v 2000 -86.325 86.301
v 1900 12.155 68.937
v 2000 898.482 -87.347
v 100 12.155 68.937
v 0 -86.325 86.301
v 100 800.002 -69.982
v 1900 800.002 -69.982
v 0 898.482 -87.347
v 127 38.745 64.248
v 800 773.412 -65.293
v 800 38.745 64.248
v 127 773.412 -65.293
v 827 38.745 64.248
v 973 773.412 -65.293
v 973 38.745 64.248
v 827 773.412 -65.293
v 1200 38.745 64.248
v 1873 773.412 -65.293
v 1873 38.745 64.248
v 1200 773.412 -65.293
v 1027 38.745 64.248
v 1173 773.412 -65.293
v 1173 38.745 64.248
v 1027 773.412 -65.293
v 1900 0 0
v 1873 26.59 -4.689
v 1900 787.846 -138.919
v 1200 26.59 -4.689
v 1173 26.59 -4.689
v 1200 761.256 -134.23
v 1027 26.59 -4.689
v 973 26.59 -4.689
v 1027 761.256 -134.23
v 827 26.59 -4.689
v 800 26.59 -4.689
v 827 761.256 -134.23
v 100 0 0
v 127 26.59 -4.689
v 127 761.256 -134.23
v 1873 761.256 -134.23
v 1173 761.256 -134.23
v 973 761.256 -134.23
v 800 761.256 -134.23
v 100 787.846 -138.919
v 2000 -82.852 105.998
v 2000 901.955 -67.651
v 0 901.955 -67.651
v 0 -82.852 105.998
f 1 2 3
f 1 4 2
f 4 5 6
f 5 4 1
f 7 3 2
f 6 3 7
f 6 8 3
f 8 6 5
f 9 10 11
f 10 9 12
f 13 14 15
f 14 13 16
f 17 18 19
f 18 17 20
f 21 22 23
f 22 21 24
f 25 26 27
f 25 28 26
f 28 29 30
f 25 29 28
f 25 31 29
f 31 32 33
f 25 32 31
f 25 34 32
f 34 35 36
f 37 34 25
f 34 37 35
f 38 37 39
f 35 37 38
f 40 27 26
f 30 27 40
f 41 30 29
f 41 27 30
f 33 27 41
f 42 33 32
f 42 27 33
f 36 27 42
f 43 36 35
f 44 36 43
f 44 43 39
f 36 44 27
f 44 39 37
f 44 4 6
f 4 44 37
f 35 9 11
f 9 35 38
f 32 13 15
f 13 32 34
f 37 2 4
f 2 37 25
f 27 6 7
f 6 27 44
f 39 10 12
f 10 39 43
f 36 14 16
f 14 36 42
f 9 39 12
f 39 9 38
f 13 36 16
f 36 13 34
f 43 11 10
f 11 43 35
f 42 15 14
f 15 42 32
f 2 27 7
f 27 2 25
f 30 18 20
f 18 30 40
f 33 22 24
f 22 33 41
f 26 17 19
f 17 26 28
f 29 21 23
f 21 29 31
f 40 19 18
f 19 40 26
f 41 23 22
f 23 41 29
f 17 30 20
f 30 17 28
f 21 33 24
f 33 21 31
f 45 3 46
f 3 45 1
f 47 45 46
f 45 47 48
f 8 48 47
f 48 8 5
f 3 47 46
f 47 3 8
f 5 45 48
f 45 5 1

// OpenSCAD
// file: roof-frame.scad
/*

    Nightstand
    
    By Anton Augustsson
    
    
*/

module roofFrame (
    plankWidth,plankThickness,
    totalWidth,totalLength,
    roofHangover,roofThickness,
    x,y,z,rotation){



// ---------- Calculated varables ----------

positionMiddleStud=700;
//totalLength/3*2-plankThickness+roofHangover+100

// ---------- Code ---------- 

translate([x,y,z])
rotate([0,0,rotation])  
union(){    
// ---------- Stud ---------- 
color("Wheat")
union(){
// Stud Front
translate([
    0,
    0,
    0]) 
cube(size = [
    (totalLength-roofHangover*2)/2,
    plankThickness,
    plankWidth]);

// Stud Back
translate([
    0,
    totalWidth-plankThickness
    -roofHangover*2,
    0]) 
cube(size = [
    (totalLength-roofHangover*2)/2,
    plankThickness,
    plankWidth]);

// Stud Left
translate([
    0,
    plankThickness,
    0]) 
cube(size = [
    plankThickness,
    totalWidth-plankThickness*2
    -roofHangover*2,
    plankWidth]);    

// Stud Middle
translate([
    positionMiddleStud,
    plankThickness,
    0]) 
cube(size = [
    plankThickness,
    totalWidth-plankThickness*2
    -roofHangover*2,
    plankWidth]);  

// Stud Right
translate([
    (totalLength-roofHangover*2)/2
    -plankThickness,
    plankThickness,
    0]) 
cube(size = [
    plankThickness,
    totalWidth-plankThickness*2
    -roofHangover*2,
    plankWidth]);
}
}}



/*
    ---------- Exampel ---------- 
*/


rotation = 10;
plankWidth     = 140;  // pine

plankThickness = 45;  // pine

totalWidth  = 1000;  // kayak width 
totalLength = 2000;  // kayak lenght

roofHangover = 100;  // etch side, only to studes
roofWidthIn  = 1000;  // calculated hypnotherapy, inner

studsAmount  = 2;  // kayak lenght, oposid diraction

roofHeight = 1;


roofFrame (
    70,27,
    totalWidth,totalLength,
    roofHangover,20,
    roofHangover,0,0,0);
roofFrame (
    70,27,
    totalWidth,totalLength,
    roofHangover,20,
    roofHangover
    +(totalLength-roofHangover*2),
    totalWidth-roofHangover*2,
    0,180);
// main file
/*

    Nightstand
    
    By Anton Augustsson
    
    
*/

use <roof-frame.scad>;

module roof (
    rotation,
    plankWidth,plankThickness,
    totalWidth,totalLength,
    roofHangover,roofThickness,
    x,y,z){



// ---------- Calculated varables ----------

    


// ---------- Code ---------- 

translate([x,y,z])
rotate([-rotation,0,0])     
union(){
    
// ---------- Stud ---------- 
color("Wheat")
union(){
roofFrame (
    70,27,
    totalWidth,totalLength,
    roofHangover,20,
    roofHangover,0,0,0);
roofFrame (
    70,27,
    totalWidth,totalLength,
    roofHangover,20,
    roofHangover
    +(totalLength-roofHangover*2),
    totalWidth-roofHangover*2,
    0,180);
}


// ---------- Roof ----------
color("Tan")
union(){
translate([
    0,
    -roofHangover,
    plankWidth]) 
cube(size = [
    totalLength,
    totalWidth,
    roofThickness]);

}}}



/*
    ---------- Exampel ---------- 
*/


rotation = 10;
plankWidth     = 140;  // pine

plankThickness = 45;  // pine

totalWidth  = 1000;  // kayak width 
totalLength = 2000;  // kayak lenght

roofHangover = 100;  // etch side, only to studes
roofWidthIn  = 1000;  // calculated hypnotherapy, inner

studsAmount  = 2;  // kayak lenght, oposid diraction

roofHeight = 1;


roof (
    rotation,
    70,27,
    totalWidth,totalLength,
    roofHangover,20,
    0,0,0);
